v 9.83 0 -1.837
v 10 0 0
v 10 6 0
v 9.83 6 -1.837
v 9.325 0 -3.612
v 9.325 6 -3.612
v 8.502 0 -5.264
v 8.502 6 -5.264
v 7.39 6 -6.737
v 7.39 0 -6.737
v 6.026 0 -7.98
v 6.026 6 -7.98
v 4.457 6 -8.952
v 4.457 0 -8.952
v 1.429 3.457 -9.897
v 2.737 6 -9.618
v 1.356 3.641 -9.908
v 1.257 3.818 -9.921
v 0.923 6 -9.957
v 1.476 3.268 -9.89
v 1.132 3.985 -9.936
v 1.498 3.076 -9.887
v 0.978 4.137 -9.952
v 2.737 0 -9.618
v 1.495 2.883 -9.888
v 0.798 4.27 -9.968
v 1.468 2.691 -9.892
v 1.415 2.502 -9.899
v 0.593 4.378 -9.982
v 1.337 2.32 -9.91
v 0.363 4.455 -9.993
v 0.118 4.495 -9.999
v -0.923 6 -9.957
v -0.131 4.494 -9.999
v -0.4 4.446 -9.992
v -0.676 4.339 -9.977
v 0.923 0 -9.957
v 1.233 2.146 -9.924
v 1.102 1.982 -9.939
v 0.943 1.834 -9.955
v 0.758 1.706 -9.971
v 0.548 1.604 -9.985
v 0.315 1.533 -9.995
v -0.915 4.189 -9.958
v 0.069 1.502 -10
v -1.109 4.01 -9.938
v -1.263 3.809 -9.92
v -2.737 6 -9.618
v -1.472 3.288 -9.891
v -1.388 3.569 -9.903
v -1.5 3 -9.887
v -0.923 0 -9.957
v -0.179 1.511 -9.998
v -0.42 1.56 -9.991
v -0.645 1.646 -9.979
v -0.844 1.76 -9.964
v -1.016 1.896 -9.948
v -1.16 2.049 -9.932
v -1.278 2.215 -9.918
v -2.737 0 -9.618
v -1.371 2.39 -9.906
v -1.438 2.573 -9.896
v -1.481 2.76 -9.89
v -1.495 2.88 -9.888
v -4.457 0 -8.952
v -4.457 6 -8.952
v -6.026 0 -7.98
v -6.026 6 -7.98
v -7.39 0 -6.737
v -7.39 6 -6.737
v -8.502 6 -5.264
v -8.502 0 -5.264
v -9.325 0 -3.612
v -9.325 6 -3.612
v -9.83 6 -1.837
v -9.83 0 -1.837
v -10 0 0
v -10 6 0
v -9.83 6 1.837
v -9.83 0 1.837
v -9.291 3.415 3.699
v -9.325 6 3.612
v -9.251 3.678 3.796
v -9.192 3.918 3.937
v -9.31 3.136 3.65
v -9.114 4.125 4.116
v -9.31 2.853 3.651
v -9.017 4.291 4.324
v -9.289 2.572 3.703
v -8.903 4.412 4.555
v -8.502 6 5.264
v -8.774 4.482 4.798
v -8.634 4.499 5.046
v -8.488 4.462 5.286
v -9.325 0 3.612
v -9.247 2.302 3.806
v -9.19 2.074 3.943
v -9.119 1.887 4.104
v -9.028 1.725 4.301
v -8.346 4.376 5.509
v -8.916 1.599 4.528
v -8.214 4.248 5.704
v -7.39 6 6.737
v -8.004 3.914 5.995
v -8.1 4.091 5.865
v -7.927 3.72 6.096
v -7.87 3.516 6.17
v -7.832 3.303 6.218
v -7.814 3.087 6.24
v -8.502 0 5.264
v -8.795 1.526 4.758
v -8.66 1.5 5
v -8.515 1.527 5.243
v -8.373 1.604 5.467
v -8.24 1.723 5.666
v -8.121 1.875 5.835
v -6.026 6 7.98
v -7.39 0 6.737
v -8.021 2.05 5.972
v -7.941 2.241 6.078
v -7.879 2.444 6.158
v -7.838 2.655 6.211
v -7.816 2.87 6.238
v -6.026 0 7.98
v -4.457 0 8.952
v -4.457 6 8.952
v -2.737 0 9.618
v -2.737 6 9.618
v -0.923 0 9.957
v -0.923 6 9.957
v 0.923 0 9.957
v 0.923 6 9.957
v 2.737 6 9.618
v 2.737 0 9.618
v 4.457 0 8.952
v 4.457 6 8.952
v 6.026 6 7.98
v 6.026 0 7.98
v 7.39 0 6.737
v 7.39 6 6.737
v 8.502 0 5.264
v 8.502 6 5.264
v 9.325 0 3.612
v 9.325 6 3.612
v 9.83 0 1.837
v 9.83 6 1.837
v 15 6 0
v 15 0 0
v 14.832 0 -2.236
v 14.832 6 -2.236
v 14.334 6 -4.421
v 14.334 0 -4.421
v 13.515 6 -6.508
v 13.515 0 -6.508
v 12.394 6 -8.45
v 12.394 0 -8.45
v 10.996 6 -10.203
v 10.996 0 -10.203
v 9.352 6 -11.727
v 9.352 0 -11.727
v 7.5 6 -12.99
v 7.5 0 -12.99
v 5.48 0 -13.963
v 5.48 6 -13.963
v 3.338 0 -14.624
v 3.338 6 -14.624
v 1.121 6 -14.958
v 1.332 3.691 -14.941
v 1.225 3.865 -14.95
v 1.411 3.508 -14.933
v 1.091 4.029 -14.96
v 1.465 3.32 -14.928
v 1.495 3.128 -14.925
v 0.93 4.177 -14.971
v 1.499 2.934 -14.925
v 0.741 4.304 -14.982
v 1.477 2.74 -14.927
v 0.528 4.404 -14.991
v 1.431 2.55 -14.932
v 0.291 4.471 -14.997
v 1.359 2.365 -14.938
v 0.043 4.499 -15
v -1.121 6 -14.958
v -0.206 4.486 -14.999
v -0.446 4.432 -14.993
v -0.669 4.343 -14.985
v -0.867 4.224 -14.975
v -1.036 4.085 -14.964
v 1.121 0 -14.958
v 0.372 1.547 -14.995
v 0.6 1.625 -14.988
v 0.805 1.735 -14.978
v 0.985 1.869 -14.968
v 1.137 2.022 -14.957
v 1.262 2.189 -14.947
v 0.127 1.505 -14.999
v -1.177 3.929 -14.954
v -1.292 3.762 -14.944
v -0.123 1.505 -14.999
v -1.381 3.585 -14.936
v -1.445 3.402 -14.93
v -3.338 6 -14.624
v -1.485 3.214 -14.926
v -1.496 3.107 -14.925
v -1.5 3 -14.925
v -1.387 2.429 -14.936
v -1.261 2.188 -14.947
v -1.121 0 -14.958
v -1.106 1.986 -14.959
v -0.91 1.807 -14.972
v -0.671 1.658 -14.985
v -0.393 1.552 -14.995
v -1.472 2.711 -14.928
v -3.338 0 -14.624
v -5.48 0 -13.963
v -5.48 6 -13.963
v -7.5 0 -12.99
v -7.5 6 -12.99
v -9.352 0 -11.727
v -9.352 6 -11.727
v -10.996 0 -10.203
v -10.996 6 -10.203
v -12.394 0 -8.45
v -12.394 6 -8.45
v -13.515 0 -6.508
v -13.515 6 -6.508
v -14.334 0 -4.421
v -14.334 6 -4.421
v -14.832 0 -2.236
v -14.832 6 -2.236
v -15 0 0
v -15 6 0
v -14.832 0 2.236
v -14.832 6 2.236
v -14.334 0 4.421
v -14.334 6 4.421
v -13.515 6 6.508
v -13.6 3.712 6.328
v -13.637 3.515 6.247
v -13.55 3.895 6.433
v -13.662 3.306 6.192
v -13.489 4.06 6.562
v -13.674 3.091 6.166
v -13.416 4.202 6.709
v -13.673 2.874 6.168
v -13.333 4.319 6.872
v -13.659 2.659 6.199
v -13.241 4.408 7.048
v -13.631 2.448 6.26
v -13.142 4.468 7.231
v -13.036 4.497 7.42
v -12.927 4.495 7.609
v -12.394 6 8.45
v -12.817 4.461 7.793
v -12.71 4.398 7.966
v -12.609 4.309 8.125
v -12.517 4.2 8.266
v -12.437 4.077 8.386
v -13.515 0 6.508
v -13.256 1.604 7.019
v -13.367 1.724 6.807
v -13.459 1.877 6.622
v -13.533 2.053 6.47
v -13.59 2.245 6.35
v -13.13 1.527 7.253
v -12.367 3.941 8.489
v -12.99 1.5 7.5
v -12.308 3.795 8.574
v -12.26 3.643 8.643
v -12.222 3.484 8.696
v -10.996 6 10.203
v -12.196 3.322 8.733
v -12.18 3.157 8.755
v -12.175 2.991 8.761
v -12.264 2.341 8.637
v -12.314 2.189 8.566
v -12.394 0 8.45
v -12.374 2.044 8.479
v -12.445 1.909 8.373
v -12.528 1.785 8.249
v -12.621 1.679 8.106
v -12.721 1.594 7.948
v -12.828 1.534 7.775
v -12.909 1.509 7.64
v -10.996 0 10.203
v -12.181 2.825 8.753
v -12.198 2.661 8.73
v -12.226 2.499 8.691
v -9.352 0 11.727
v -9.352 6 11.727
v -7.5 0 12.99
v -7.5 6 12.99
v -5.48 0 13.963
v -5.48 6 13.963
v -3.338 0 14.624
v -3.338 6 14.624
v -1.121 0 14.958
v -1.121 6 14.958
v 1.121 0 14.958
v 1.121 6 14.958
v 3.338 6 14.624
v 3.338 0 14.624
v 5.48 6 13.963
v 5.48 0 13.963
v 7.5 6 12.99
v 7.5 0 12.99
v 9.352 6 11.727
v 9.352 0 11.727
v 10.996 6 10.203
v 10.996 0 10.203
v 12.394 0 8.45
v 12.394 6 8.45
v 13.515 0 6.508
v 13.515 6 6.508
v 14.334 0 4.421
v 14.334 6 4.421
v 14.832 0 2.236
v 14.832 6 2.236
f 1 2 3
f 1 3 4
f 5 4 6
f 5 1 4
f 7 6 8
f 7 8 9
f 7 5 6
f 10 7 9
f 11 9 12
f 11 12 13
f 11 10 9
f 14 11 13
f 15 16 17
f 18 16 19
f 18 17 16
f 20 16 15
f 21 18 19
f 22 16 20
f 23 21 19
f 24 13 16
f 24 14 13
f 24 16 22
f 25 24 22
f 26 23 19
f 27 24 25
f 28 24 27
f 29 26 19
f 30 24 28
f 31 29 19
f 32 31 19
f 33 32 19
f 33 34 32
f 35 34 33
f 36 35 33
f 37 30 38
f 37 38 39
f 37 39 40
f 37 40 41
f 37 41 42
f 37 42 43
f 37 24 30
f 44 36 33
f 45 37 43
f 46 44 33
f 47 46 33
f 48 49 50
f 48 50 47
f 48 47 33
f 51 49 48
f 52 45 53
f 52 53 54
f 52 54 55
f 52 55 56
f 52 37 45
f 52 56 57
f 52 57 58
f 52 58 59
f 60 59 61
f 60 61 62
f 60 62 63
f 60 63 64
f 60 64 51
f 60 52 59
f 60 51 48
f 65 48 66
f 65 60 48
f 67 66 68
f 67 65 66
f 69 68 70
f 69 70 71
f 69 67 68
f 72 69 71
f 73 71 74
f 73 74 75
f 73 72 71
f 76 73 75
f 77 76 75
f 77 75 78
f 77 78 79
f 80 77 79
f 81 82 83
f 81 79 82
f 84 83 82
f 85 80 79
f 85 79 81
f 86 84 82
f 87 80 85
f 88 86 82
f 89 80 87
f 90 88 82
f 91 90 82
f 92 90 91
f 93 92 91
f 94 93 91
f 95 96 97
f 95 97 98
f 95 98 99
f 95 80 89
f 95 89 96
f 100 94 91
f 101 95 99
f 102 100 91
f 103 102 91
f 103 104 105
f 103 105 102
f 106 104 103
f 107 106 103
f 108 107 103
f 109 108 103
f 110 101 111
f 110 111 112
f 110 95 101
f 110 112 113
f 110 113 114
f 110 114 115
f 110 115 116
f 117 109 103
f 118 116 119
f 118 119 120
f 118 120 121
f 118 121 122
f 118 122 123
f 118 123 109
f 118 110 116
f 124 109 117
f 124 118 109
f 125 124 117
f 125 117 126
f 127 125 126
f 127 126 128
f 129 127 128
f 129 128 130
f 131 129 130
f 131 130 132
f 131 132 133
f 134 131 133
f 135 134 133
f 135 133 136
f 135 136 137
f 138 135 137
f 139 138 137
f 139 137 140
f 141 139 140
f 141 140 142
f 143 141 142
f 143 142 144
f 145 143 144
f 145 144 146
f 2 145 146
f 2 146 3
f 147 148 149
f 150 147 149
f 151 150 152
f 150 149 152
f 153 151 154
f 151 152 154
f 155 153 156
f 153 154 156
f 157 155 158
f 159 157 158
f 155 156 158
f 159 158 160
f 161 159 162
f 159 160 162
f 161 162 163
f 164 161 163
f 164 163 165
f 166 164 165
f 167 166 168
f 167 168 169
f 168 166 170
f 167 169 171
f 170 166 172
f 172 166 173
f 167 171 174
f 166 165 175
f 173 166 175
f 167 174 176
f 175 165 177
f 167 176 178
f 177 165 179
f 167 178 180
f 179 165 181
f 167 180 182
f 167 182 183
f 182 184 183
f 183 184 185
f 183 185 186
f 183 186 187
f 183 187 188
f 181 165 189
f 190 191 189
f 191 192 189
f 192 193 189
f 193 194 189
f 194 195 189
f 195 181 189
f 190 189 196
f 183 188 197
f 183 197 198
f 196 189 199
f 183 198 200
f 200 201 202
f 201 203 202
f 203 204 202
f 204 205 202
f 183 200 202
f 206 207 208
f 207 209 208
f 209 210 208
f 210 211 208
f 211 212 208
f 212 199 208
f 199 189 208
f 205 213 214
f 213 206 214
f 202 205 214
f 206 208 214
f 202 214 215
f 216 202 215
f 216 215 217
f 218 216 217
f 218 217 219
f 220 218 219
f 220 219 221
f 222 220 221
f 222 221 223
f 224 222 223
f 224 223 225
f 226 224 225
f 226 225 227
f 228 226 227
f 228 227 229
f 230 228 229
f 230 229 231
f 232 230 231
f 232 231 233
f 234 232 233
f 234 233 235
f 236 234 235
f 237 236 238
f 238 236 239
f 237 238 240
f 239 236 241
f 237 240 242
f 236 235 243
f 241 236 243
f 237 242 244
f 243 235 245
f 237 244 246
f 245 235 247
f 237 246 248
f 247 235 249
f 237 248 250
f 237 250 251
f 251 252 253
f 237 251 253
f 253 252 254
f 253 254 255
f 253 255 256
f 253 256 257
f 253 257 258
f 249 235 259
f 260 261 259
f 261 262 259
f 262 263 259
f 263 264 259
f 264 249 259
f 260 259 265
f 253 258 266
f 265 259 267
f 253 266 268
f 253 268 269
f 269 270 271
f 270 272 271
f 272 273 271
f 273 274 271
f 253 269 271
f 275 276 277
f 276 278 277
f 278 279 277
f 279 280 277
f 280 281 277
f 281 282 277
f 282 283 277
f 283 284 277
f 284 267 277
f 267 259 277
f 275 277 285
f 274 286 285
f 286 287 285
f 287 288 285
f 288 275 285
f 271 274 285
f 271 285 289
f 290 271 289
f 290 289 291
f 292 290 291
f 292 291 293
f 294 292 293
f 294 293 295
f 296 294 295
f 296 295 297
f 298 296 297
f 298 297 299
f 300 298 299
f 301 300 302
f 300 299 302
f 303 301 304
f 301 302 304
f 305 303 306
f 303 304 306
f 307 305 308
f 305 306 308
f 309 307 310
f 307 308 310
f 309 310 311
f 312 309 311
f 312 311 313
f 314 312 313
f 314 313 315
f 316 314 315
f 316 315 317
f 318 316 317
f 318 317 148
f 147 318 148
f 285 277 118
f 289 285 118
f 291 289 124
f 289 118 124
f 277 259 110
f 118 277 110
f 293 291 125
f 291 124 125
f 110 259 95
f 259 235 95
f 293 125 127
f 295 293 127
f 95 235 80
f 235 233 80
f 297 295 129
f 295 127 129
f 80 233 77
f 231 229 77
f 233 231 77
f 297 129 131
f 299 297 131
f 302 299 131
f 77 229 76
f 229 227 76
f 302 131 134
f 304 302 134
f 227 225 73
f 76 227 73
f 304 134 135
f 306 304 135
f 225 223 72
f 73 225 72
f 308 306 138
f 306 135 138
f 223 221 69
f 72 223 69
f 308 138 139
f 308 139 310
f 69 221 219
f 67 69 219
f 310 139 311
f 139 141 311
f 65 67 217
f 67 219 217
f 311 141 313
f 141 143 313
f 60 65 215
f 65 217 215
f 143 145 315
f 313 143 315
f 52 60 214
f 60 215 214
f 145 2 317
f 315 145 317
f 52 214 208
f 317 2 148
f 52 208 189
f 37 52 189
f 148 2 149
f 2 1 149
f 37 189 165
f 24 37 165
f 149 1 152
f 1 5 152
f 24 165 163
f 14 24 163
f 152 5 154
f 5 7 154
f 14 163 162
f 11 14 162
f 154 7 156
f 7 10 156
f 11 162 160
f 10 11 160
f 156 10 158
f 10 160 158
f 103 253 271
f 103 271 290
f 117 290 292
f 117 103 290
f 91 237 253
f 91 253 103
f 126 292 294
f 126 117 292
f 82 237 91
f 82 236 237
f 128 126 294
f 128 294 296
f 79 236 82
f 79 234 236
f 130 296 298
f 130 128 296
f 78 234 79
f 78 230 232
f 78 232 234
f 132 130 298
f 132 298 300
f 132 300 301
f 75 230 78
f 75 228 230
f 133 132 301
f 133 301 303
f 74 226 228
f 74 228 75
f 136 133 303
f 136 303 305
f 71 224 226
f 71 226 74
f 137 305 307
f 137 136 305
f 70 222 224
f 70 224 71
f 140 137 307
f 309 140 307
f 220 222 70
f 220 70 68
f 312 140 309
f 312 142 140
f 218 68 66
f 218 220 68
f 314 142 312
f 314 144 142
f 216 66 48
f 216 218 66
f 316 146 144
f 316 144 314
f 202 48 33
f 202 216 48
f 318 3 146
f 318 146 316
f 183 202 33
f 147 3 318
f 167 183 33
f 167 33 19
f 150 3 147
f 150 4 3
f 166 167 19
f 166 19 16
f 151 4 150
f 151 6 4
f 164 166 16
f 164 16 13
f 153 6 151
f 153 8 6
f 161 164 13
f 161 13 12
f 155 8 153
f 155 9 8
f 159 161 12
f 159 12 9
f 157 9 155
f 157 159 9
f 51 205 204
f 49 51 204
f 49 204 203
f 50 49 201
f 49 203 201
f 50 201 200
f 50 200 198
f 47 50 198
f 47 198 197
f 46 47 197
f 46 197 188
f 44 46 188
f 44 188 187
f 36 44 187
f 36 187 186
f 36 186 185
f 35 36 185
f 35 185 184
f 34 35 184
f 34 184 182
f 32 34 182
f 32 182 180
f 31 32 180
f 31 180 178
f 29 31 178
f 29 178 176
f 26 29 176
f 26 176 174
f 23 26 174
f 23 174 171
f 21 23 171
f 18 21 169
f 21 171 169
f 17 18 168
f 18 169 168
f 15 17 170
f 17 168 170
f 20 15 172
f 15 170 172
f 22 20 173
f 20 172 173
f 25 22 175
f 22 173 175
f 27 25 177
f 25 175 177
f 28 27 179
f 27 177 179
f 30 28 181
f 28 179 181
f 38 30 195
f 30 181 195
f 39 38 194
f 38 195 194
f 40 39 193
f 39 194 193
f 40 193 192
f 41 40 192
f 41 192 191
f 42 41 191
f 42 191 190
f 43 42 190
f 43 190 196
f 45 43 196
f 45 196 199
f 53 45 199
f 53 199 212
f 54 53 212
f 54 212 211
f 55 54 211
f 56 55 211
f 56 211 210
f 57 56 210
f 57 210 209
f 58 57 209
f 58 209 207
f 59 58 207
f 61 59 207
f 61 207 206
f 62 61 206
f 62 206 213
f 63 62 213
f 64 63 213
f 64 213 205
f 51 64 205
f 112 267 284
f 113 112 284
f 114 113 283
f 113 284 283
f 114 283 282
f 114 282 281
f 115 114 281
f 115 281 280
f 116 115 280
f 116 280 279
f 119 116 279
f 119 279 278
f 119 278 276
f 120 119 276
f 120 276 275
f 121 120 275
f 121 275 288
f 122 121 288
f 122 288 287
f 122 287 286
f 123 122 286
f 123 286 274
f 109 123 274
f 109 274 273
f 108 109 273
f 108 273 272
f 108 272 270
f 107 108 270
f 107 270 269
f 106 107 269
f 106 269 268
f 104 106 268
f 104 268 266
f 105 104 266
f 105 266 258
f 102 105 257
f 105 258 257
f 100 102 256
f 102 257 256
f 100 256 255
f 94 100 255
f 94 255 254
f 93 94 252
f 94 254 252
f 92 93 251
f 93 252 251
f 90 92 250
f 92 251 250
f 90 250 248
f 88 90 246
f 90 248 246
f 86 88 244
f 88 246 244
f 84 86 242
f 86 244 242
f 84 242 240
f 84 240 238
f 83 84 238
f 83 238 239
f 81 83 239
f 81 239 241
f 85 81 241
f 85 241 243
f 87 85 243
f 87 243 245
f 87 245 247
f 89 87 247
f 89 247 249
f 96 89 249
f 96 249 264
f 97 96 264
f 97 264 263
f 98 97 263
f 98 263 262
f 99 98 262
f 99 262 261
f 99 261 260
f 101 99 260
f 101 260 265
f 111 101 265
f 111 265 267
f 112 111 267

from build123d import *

# Parameters (mm, degrees)
SKETCH_1_R          = 15
SKETCH_1_R_2        = 10
EXTRUDE_1_DEPTH     = 6
CUT_EXTRUDE_1_REACH = 32
SKETCH_2_R          = 1.5
CUT_EXTRUDE_2_REACH = 37.49
SKETCH_3_R          = 1.5


with BuildPart() as part:
    # 스케치1 → 보스-돌출1 (new body)
    with BuildSketch(Plane(origin=(0, 0, 0), x_dir=(1, 0, 0), z_dir=(0, 1, 0))):
        Circle(SKETCH_1_R)
        Circle(SKETCH_1_R_2, mode=Mode.SUBTRACT)
    extrude(amount=EXTRUDE_1_DEPTH)

    # 스케치2 → 컷-돌출1 (cut, up to next)
    with BuildSketch(Plane(origin=(0, 0, -15), x_dir=(-1, 0, 0), z_dir=(0, 0, -1)), mode=Mode.PRIVATE) as cut_extrude_1_sk1:
        with Locations((0, 3)):
            Circle(SKETCH_2_R)
    cut_extrude_1_tool1 = extrude(cut_extrude_1_sk1.sketch, amount=-CUT_EXTRUDE_1_REACH, mode=Mode.PRIVATE) & part.part
    add(cut_extrude_1_tool1.solids().sort_by_distance((0, 3, -15))[0], mode=Mode.SUBTRACT)

    # 스케치3 → 컷-돌출2 (cut, up to next)
    with BuildSketch(Plane(origin=(-12.990381057, 0, 7.5), x_dir=(0, -1, 0), z_dir=(-0.866025404, 0, 0.5)), mode=Mode.PRIVATE) as cut_extrude_2_sk1:
        with Locations((-3, 0)):
            Circle(SKETCH_3_R)
    cut_extrude_2_tool1 = extrude(cut_extrude_2_sk1.sketch, amount=-CUT_EXTRUDE_2_REACH, mode=Mode.PRIVATE) & part.part
    add(cut_extrude_2_tool1.solids().sort_by_distance((-12.990381, 3, 7.5))[0], mode=Mode.SUBTRACT)


solid = part.part
